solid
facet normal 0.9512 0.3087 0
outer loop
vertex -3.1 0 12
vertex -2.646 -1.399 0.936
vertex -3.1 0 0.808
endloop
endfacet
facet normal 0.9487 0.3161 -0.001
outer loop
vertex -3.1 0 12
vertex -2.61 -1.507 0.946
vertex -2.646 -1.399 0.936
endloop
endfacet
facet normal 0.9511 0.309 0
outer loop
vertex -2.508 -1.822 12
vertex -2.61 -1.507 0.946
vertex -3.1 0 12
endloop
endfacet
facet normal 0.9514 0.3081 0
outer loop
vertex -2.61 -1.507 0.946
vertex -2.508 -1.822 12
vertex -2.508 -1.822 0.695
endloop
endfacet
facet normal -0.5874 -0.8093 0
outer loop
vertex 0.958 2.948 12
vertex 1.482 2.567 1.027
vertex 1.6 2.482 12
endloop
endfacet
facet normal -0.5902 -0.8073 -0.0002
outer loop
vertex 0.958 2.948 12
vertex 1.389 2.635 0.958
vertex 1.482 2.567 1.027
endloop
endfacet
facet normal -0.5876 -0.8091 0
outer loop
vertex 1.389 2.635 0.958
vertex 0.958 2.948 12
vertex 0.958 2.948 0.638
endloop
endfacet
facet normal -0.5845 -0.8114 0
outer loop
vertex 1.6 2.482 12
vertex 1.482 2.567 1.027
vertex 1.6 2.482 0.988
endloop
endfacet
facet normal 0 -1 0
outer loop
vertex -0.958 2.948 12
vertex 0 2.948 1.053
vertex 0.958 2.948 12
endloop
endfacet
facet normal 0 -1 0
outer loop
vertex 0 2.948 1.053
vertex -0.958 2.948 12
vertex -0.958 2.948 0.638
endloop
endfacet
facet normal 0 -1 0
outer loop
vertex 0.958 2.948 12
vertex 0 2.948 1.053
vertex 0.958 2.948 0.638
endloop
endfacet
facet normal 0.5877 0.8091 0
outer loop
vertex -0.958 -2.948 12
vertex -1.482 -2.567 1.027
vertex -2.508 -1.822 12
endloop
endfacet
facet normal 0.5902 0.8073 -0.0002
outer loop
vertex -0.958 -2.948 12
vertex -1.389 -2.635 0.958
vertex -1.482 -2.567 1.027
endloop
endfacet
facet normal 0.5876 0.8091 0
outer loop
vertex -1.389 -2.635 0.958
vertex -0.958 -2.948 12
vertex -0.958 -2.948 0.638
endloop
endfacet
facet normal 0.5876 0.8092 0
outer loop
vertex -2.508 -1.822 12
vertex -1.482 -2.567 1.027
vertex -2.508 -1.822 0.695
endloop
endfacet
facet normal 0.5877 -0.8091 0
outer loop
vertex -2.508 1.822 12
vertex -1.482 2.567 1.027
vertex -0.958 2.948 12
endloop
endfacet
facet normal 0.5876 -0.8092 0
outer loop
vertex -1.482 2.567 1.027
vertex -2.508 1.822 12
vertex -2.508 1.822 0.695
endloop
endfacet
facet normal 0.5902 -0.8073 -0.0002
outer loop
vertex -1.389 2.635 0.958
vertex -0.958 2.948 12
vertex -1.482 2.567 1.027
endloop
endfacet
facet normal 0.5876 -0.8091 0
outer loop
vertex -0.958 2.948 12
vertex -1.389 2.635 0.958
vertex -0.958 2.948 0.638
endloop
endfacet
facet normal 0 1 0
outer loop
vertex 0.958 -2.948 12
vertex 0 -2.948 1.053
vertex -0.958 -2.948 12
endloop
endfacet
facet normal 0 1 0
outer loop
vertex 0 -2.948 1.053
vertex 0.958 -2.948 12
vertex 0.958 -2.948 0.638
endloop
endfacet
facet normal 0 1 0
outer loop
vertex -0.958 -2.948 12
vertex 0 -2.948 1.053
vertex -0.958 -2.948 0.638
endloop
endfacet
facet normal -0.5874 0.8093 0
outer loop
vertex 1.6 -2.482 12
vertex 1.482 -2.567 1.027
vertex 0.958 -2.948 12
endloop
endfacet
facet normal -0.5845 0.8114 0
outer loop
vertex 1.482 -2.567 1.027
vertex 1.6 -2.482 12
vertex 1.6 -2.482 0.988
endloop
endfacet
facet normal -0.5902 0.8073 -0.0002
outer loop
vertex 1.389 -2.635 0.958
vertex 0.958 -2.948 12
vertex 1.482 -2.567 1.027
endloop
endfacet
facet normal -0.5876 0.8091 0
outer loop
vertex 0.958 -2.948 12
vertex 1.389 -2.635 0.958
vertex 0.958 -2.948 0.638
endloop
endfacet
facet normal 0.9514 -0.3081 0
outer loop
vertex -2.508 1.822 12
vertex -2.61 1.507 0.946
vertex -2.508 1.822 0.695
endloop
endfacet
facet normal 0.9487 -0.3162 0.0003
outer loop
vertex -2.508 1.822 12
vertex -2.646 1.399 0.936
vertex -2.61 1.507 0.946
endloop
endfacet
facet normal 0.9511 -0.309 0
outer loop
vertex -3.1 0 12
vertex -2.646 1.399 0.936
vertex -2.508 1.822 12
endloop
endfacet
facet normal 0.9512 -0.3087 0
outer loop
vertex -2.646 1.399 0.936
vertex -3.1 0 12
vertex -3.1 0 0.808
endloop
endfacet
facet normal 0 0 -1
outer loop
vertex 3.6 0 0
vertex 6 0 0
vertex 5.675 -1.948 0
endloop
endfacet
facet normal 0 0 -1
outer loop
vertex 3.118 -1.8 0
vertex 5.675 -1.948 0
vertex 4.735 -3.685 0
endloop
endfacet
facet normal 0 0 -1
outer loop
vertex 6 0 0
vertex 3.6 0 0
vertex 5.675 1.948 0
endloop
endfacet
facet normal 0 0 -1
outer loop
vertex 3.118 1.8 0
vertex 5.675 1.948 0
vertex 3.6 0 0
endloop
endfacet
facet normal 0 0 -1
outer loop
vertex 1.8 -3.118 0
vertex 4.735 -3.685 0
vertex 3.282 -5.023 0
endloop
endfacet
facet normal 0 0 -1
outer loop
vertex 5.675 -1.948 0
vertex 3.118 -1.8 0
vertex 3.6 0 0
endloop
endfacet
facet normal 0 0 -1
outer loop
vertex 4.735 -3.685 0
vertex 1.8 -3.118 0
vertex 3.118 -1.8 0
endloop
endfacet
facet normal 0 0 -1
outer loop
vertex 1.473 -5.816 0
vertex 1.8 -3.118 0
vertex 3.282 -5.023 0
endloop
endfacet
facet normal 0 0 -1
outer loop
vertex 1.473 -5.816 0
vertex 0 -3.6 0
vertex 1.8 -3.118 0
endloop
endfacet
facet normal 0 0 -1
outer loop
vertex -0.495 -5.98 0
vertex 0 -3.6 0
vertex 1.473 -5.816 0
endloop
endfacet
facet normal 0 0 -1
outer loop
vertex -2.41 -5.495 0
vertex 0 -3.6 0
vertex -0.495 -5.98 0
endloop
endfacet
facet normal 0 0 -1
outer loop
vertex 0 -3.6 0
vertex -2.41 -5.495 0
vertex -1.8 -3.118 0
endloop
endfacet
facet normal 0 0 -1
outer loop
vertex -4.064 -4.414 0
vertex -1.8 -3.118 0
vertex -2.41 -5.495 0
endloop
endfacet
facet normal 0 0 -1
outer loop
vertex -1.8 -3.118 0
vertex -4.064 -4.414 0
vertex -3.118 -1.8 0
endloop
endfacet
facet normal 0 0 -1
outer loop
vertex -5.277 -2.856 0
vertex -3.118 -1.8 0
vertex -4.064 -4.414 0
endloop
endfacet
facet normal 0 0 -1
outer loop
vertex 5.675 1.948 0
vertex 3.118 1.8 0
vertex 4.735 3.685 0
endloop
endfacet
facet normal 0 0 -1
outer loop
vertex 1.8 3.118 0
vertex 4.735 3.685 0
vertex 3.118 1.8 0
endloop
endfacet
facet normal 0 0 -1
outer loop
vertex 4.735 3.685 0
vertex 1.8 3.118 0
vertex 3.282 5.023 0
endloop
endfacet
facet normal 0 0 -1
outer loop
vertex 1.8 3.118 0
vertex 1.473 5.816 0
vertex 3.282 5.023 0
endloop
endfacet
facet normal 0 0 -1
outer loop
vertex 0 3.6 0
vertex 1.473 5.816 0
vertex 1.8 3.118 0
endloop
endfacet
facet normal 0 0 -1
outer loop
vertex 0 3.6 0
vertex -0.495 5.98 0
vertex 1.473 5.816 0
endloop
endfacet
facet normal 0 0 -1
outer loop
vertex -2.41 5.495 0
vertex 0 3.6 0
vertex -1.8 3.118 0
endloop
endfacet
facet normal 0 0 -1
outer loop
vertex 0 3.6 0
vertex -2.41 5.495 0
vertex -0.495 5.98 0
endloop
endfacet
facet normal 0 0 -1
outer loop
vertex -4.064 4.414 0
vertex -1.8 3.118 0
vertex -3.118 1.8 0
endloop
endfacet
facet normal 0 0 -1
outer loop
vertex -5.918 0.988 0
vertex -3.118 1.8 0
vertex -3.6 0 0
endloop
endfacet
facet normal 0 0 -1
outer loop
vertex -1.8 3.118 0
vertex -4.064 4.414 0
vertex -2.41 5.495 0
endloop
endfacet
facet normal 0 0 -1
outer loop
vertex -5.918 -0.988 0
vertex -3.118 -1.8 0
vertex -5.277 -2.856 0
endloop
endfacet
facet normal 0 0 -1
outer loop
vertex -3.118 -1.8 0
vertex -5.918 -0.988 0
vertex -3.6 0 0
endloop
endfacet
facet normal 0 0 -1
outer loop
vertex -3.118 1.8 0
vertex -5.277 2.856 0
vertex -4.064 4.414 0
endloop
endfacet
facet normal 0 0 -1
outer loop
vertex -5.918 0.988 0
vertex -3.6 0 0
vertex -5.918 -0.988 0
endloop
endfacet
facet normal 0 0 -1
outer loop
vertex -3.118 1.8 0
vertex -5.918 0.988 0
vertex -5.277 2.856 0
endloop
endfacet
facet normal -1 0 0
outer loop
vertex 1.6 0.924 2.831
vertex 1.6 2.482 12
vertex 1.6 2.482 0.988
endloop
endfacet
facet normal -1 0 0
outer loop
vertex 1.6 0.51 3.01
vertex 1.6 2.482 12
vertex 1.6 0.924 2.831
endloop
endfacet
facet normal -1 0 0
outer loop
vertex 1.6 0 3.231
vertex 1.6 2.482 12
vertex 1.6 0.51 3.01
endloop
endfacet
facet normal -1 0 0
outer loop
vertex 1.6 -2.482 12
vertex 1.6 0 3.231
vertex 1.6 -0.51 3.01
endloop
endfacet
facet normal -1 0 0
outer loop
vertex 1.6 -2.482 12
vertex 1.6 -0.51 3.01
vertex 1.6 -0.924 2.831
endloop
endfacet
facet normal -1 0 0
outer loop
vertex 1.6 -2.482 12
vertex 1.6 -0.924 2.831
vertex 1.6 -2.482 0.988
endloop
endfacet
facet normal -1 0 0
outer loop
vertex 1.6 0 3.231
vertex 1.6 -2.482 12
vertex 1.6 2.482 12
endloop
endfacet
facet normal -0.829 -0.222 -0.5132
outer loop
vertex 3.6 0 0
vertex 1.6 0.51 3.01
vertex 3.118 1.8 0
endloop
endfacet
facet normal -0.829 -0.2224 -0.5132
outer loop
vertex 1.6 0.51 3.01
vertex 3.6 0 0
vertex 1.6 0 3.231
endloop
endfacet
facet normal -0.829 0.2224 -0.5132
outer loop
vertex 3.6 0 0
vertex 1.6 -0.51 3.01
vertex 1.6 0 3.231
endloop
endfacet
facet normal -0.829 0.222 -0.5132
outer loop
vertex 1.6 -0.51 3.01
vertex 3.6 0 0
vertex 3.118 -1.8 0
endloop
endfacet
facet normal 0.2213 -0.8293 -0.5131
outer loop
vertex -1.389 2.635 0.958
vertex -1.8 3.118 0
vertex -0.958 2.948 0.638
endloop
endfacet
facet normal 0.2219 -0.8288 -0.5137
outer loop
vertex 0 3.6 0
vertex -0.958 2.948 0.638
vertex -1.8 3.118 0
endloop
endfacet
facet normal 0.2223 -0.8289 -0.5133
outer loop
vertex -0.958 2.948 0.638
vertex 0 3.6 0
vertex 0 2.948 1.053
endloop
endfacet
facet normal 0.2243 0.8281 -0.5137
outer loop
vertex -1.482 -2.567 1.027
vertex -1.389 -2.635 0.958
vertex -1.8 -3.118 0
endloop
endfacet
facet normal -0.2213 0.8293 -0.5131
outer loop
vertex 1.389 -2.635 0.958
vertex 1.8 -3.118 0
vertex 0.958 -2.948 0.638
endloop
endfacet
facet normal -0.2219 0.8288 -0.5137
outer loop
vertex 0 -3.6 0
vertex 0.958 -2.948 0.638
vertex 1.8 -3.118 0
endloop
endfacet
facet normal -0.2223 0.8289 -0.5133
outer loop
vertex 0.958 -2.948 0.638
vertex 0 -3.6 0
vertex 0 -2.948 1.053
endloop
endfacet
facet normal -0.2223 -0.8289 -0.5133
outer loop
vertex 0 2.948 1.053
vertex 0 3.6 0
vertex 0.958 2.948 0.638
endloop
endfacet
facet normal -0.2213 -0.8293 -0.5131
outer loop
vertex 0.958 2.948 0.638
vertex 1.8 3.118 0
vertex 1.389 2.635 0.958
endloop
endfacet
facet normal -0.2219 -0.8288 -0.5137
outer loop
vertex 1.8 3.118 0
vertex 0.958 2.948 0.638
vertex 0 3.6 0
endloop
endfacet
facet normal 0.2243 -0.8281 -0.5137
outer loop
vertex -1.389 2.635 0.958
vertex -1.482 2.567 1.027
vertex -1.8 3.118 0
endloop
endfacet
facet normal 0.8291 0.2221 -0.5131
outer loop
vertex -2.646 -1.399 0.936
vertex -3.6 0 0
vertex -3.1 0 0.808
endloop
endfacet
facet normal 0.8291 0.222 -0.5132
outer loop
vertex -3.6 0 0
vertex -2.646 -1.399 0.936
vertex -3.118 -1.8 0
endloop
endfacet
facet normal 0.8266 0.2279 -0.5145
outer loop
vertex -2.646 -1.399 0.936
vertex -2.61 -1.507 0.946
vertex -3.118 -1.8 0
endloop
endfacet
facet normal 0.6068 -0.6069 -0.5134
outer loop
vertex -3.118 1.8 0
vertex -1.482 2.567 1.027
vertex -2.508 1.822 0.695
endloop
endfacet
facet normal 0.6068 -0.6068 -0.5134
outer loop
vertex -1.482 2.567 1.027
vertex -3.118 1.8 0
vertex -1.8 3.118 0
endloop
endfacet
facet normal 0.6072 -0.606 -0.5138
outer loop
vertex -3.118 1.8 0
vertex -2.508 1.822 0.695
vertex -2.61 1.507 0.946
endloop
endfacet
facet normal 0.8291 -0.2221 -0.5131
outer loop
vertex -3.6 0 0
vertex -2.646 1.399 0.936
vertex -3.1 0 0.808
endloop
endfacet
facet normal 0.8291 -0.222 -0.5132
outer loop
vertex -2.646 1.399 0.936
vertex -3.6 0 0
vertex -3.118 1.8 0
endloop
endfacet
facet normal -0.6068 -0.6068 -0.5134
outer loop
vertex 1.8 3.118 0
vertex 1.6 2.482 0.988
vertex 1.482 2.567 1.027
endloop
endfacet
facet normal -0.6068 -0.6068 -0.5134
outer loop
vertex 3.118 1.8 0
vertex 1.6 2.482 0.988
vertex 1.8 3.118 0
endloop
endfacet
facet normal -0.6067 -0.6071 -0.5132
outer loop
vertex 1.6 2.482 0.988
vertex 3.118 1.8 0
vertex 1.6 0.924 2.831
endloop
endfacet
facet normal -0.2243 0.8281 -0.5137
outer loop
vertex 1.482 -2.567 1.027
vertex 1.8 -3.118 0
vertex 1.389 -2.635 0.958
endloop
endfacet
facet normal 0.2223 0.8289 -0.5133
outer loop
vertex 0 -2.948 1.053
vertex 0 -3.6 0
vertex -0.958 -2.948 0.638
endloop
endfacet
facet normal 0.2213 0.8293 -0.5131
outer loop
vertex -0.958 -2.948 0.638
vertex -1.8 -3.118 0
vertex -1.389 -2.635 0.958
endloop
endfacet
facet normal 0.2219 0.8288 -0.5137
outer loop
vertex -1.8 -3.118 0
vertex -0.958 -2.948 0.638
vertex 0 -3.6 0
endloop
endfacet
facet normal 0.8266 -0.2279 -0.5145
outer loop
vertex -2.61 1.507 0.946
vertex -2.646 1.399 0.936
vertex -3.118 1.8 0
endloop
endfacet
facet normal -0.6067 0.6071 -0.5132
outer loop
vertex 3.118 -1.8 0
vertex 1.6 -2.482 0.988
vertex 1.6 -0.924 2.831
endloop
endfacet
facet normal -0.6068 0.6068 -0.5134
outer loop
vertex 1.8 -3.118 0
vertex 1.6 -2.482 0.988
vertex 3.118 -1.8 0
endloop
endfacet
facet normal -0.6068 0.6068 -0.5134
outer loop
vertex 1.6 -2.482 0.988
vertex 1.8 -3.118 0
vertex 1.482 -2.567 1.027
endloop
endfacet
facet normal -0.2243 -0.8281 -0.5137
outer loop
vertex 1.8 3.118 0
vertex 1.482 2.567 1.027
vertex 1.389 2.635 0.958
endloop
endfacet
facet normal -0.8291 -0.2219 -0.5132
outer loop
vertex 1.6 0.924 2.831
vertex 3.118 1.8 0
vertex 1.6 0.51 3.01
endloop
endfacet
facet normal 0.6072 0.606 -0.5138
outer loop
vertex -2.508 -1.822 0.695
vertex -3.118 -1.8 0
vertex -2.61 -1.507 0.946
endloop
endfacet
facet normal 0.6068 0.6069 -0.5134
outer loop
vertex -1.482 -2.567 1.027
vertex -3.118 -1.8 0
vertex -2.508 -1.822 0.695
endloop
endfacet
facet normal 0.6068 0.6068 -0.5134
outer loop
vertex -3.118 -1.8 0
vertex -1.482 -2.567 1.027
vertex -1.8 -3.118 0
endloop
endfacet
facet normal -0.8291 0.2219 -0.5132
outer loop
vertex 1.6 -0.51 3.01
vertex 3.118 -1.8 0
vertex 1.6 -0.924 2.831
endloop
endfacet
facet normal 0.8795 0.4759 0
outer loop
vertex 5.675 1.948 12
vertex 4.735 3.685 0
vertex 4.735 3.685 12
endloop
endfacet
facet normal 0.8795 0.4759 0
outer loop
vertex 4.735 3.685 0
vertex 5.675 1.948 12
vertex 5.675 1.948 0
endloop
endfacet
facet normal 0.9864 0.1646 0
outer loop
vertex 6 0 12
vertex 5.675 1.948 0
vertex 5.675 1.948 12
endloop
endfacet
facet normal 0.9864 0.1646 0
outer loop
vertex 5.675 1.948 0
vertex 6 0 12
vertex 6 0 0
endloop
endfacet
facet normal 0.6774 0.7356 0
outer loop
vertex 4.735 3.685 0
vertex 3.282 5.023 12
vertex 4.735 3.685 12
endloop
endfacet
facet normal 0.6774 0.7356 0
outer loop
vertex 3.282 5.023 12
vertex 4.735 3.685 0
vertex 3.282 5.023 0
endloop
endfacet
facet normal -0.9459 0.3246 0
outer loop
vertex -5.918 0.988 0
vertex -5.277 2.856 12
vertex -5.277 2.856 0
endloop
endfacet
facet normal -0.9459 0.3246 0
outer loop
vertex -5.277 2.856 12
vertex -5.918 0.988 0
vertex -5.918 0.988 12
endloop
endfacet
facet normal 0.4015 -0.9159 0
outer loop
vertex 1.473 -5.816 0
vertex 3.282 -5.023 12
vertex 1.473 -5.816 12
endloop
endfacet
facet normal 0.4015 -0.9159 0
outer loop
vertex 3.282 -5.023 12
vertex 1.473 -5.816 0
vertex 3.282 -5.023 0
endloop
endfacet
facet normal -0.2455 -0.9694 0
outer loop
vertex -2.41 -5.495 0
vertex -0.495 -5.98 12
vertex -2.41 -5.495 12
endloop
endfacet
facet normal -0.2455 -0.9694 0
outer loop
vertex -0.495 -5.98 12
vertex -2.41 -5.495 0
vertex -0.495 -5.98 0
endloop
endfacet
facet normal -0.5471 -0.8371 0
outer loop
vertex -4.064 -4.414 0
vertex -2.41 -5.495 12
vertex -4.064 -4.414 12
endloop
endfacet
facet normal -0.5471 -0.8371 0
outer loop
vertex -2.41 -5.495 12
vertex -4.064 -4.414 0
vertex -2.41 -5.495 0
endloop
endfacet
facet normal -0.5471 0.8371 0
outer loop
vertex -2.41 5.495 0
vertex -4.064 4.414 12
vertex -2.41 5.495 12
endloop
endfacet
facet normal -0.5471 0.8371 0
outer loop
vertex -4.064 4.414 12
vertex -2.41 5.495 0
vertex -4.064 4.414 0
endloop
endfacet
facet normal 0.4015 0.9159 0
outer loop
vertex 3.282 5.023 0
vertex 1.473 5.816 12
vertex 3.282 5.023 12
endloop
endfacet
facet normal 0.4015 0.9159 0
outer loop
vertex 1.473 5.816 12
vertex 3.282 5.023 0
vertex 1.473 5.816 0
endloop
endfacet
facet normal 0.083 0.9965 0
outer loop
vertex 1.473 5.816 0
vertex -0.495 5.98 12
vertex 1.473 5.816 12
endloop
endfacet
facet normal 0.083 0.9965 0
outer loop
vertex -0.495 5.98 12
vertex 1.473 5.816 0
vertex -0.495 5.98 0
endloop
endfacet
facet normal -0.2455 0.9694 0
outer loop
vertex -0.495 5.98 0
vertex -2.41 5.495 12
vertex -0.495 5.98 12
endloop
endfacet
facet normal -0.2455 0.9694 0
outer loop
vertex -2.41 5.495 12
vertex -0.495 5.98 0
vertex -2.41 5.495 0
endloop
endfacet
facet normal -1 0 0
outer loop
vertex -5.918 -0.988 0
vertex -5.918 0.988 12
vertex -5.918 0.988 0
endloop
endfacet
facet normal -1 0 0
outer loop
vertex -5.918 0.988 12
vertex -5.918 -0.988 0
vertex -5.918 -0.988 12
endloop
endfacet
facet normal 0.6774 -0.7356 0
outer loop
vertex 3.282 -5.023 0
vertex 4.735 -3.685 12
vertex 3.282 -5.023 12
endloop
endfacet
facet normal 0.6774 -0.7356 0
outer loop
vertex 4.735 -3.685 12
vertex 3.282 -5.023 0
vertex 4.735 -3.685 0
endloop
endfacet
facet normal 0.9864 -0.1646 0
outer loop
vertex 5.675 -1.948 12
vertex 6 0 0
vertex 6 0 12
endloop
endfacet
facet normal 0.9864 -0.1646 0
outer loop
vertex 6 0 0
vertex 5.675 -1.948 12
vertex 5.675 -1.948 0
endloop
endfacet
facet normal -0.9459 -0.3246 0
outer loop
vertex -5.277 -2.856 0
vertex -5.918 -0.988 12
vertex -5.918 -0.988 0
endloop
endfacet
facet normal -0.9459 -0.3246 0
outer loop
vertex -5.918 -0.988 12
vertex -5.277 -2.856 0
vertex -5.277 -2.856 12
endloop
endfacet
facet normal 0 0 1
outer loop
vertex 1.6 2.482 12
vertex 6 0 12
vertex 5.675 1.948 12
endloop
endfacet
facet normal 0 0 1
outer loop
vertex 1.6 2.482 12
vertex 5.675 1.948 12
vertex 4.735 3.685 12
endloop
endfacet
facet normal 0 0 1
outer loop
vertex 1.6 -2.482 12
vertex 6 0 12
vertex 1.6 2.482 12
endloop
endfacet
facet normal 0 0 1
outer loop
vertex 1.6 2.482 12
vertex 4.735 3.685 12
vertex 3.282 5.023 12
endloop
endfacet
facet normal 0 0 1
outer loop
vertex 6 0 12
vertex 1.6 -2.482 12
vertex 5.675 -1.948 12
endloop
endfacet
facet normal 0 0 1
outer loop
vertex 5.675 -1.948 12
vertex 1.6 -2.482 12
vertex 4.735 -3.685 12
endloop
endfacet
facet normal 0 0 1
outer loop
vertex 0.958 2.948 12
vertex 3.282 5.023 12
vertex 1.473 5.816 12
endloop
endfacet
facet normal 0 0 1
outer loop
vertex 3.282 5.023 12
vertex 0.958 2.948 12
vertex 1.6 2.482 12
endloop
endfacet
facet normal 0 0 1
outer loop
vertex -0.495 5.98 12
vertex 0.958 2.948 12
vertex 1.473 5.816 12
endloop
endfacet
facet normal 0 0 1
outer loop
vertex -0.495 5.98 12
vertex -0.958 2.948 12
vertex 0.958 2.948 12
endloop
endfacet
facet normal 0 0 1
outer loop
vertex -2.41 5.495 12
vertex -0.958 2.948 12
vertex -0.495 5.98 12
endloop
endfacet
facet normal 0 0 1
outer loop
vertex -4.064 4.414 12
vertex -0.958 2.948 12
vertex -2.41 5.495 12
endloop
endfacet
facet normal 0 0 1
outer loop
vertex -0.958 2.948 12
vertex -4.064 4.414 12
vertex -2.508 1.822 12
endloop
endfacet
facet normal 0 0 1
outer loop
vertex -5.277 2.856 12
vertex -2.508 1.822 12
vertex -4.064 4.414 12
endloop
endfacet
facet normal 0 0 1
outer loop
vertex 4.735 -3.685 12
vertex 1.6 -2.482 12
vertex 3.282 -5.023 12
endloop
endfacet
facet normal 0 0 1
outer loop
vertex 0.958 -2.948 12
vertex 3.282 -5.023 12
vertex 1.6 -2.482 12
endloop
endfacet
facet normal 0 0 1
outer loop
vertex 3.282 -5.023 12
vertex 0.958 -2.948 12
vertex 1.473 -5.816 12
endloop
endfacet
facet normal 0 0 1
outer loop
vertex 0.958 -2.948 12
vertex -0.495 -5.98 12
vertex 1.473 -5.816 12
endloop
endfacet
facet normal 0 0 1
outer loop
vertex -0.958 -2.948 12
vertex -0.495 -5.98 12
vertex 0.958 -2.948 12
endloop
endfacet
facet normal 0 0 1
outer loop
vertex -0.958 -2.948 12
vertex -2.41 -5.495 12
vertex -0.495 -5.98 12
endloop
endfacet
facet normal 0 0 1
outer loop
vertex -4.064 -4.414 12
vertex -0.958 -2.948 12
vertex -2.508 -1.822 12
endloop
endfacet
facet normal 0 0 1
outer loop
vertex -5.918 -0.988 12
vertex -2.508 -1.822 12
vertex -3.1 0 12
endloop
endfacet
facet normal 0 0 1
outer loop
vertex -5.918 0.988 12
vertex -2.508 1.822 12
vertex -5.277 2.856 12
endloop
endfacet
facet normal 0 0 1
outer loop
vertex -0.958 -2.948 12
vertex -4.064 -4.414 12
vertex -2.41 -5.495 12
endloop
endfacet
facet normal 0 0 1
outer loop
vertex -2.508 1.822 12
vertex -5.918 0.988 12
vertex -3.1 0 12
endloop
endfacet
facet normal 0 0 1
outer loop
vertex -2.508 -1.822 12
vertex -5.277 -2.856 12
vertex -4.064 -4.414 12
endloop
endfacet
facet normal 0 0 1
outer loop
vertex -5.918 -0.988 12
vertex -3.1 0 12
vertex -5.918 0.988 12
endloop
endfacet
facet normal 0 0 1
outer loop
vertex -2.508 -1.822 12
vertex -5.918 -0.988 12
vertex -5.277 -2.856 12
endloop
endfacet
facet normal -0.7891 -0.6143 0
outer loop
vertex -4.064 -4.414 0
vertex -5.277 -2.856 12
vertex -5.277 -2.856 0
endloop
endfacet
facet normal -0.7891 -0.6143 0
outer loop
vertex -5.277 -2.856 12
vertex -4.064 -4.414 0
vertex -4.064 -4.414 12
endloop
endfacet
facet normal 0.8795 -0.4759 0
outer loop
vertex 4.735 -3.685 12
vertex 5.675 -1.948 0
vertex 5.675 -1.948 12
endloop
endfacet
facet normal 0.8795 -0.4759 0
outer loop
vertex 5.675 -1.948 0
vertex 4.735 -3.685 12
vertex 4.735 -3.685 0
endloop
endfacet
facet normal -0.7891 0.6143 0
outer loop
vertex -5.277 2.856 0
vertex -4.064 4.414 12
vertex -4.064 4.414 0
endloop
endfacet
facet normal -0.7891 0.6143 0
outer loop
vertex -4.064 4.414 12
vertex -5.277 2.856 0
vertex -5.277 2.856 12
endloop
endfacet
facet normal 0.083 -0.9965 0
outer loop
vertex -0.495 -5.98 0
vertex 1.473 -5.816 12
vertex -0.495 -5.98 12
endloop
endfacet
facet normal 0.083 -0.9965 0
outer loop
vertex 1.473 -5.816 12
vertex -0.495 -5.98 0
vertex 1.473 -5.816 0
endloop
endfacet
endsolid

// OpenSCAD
difference() {
  cylinder(h=12,r=6);
  zwl_fp180ino();
}

module zwl_fp180ino() {
  shaft(6.2, 12.05, 1.6);
}
module shaft(shaftDiameter, shaftLength, offset) {
  difference() {
    cylinder(h=shaftLength,r=shaftDiameter/2);
    translate([offset, -shaftLength/2, 0])
    cube(shaftLength);
  }
  cylinder(h=shaftDiameter - 2, r1=shaftDiameter/2 + .5);
}
